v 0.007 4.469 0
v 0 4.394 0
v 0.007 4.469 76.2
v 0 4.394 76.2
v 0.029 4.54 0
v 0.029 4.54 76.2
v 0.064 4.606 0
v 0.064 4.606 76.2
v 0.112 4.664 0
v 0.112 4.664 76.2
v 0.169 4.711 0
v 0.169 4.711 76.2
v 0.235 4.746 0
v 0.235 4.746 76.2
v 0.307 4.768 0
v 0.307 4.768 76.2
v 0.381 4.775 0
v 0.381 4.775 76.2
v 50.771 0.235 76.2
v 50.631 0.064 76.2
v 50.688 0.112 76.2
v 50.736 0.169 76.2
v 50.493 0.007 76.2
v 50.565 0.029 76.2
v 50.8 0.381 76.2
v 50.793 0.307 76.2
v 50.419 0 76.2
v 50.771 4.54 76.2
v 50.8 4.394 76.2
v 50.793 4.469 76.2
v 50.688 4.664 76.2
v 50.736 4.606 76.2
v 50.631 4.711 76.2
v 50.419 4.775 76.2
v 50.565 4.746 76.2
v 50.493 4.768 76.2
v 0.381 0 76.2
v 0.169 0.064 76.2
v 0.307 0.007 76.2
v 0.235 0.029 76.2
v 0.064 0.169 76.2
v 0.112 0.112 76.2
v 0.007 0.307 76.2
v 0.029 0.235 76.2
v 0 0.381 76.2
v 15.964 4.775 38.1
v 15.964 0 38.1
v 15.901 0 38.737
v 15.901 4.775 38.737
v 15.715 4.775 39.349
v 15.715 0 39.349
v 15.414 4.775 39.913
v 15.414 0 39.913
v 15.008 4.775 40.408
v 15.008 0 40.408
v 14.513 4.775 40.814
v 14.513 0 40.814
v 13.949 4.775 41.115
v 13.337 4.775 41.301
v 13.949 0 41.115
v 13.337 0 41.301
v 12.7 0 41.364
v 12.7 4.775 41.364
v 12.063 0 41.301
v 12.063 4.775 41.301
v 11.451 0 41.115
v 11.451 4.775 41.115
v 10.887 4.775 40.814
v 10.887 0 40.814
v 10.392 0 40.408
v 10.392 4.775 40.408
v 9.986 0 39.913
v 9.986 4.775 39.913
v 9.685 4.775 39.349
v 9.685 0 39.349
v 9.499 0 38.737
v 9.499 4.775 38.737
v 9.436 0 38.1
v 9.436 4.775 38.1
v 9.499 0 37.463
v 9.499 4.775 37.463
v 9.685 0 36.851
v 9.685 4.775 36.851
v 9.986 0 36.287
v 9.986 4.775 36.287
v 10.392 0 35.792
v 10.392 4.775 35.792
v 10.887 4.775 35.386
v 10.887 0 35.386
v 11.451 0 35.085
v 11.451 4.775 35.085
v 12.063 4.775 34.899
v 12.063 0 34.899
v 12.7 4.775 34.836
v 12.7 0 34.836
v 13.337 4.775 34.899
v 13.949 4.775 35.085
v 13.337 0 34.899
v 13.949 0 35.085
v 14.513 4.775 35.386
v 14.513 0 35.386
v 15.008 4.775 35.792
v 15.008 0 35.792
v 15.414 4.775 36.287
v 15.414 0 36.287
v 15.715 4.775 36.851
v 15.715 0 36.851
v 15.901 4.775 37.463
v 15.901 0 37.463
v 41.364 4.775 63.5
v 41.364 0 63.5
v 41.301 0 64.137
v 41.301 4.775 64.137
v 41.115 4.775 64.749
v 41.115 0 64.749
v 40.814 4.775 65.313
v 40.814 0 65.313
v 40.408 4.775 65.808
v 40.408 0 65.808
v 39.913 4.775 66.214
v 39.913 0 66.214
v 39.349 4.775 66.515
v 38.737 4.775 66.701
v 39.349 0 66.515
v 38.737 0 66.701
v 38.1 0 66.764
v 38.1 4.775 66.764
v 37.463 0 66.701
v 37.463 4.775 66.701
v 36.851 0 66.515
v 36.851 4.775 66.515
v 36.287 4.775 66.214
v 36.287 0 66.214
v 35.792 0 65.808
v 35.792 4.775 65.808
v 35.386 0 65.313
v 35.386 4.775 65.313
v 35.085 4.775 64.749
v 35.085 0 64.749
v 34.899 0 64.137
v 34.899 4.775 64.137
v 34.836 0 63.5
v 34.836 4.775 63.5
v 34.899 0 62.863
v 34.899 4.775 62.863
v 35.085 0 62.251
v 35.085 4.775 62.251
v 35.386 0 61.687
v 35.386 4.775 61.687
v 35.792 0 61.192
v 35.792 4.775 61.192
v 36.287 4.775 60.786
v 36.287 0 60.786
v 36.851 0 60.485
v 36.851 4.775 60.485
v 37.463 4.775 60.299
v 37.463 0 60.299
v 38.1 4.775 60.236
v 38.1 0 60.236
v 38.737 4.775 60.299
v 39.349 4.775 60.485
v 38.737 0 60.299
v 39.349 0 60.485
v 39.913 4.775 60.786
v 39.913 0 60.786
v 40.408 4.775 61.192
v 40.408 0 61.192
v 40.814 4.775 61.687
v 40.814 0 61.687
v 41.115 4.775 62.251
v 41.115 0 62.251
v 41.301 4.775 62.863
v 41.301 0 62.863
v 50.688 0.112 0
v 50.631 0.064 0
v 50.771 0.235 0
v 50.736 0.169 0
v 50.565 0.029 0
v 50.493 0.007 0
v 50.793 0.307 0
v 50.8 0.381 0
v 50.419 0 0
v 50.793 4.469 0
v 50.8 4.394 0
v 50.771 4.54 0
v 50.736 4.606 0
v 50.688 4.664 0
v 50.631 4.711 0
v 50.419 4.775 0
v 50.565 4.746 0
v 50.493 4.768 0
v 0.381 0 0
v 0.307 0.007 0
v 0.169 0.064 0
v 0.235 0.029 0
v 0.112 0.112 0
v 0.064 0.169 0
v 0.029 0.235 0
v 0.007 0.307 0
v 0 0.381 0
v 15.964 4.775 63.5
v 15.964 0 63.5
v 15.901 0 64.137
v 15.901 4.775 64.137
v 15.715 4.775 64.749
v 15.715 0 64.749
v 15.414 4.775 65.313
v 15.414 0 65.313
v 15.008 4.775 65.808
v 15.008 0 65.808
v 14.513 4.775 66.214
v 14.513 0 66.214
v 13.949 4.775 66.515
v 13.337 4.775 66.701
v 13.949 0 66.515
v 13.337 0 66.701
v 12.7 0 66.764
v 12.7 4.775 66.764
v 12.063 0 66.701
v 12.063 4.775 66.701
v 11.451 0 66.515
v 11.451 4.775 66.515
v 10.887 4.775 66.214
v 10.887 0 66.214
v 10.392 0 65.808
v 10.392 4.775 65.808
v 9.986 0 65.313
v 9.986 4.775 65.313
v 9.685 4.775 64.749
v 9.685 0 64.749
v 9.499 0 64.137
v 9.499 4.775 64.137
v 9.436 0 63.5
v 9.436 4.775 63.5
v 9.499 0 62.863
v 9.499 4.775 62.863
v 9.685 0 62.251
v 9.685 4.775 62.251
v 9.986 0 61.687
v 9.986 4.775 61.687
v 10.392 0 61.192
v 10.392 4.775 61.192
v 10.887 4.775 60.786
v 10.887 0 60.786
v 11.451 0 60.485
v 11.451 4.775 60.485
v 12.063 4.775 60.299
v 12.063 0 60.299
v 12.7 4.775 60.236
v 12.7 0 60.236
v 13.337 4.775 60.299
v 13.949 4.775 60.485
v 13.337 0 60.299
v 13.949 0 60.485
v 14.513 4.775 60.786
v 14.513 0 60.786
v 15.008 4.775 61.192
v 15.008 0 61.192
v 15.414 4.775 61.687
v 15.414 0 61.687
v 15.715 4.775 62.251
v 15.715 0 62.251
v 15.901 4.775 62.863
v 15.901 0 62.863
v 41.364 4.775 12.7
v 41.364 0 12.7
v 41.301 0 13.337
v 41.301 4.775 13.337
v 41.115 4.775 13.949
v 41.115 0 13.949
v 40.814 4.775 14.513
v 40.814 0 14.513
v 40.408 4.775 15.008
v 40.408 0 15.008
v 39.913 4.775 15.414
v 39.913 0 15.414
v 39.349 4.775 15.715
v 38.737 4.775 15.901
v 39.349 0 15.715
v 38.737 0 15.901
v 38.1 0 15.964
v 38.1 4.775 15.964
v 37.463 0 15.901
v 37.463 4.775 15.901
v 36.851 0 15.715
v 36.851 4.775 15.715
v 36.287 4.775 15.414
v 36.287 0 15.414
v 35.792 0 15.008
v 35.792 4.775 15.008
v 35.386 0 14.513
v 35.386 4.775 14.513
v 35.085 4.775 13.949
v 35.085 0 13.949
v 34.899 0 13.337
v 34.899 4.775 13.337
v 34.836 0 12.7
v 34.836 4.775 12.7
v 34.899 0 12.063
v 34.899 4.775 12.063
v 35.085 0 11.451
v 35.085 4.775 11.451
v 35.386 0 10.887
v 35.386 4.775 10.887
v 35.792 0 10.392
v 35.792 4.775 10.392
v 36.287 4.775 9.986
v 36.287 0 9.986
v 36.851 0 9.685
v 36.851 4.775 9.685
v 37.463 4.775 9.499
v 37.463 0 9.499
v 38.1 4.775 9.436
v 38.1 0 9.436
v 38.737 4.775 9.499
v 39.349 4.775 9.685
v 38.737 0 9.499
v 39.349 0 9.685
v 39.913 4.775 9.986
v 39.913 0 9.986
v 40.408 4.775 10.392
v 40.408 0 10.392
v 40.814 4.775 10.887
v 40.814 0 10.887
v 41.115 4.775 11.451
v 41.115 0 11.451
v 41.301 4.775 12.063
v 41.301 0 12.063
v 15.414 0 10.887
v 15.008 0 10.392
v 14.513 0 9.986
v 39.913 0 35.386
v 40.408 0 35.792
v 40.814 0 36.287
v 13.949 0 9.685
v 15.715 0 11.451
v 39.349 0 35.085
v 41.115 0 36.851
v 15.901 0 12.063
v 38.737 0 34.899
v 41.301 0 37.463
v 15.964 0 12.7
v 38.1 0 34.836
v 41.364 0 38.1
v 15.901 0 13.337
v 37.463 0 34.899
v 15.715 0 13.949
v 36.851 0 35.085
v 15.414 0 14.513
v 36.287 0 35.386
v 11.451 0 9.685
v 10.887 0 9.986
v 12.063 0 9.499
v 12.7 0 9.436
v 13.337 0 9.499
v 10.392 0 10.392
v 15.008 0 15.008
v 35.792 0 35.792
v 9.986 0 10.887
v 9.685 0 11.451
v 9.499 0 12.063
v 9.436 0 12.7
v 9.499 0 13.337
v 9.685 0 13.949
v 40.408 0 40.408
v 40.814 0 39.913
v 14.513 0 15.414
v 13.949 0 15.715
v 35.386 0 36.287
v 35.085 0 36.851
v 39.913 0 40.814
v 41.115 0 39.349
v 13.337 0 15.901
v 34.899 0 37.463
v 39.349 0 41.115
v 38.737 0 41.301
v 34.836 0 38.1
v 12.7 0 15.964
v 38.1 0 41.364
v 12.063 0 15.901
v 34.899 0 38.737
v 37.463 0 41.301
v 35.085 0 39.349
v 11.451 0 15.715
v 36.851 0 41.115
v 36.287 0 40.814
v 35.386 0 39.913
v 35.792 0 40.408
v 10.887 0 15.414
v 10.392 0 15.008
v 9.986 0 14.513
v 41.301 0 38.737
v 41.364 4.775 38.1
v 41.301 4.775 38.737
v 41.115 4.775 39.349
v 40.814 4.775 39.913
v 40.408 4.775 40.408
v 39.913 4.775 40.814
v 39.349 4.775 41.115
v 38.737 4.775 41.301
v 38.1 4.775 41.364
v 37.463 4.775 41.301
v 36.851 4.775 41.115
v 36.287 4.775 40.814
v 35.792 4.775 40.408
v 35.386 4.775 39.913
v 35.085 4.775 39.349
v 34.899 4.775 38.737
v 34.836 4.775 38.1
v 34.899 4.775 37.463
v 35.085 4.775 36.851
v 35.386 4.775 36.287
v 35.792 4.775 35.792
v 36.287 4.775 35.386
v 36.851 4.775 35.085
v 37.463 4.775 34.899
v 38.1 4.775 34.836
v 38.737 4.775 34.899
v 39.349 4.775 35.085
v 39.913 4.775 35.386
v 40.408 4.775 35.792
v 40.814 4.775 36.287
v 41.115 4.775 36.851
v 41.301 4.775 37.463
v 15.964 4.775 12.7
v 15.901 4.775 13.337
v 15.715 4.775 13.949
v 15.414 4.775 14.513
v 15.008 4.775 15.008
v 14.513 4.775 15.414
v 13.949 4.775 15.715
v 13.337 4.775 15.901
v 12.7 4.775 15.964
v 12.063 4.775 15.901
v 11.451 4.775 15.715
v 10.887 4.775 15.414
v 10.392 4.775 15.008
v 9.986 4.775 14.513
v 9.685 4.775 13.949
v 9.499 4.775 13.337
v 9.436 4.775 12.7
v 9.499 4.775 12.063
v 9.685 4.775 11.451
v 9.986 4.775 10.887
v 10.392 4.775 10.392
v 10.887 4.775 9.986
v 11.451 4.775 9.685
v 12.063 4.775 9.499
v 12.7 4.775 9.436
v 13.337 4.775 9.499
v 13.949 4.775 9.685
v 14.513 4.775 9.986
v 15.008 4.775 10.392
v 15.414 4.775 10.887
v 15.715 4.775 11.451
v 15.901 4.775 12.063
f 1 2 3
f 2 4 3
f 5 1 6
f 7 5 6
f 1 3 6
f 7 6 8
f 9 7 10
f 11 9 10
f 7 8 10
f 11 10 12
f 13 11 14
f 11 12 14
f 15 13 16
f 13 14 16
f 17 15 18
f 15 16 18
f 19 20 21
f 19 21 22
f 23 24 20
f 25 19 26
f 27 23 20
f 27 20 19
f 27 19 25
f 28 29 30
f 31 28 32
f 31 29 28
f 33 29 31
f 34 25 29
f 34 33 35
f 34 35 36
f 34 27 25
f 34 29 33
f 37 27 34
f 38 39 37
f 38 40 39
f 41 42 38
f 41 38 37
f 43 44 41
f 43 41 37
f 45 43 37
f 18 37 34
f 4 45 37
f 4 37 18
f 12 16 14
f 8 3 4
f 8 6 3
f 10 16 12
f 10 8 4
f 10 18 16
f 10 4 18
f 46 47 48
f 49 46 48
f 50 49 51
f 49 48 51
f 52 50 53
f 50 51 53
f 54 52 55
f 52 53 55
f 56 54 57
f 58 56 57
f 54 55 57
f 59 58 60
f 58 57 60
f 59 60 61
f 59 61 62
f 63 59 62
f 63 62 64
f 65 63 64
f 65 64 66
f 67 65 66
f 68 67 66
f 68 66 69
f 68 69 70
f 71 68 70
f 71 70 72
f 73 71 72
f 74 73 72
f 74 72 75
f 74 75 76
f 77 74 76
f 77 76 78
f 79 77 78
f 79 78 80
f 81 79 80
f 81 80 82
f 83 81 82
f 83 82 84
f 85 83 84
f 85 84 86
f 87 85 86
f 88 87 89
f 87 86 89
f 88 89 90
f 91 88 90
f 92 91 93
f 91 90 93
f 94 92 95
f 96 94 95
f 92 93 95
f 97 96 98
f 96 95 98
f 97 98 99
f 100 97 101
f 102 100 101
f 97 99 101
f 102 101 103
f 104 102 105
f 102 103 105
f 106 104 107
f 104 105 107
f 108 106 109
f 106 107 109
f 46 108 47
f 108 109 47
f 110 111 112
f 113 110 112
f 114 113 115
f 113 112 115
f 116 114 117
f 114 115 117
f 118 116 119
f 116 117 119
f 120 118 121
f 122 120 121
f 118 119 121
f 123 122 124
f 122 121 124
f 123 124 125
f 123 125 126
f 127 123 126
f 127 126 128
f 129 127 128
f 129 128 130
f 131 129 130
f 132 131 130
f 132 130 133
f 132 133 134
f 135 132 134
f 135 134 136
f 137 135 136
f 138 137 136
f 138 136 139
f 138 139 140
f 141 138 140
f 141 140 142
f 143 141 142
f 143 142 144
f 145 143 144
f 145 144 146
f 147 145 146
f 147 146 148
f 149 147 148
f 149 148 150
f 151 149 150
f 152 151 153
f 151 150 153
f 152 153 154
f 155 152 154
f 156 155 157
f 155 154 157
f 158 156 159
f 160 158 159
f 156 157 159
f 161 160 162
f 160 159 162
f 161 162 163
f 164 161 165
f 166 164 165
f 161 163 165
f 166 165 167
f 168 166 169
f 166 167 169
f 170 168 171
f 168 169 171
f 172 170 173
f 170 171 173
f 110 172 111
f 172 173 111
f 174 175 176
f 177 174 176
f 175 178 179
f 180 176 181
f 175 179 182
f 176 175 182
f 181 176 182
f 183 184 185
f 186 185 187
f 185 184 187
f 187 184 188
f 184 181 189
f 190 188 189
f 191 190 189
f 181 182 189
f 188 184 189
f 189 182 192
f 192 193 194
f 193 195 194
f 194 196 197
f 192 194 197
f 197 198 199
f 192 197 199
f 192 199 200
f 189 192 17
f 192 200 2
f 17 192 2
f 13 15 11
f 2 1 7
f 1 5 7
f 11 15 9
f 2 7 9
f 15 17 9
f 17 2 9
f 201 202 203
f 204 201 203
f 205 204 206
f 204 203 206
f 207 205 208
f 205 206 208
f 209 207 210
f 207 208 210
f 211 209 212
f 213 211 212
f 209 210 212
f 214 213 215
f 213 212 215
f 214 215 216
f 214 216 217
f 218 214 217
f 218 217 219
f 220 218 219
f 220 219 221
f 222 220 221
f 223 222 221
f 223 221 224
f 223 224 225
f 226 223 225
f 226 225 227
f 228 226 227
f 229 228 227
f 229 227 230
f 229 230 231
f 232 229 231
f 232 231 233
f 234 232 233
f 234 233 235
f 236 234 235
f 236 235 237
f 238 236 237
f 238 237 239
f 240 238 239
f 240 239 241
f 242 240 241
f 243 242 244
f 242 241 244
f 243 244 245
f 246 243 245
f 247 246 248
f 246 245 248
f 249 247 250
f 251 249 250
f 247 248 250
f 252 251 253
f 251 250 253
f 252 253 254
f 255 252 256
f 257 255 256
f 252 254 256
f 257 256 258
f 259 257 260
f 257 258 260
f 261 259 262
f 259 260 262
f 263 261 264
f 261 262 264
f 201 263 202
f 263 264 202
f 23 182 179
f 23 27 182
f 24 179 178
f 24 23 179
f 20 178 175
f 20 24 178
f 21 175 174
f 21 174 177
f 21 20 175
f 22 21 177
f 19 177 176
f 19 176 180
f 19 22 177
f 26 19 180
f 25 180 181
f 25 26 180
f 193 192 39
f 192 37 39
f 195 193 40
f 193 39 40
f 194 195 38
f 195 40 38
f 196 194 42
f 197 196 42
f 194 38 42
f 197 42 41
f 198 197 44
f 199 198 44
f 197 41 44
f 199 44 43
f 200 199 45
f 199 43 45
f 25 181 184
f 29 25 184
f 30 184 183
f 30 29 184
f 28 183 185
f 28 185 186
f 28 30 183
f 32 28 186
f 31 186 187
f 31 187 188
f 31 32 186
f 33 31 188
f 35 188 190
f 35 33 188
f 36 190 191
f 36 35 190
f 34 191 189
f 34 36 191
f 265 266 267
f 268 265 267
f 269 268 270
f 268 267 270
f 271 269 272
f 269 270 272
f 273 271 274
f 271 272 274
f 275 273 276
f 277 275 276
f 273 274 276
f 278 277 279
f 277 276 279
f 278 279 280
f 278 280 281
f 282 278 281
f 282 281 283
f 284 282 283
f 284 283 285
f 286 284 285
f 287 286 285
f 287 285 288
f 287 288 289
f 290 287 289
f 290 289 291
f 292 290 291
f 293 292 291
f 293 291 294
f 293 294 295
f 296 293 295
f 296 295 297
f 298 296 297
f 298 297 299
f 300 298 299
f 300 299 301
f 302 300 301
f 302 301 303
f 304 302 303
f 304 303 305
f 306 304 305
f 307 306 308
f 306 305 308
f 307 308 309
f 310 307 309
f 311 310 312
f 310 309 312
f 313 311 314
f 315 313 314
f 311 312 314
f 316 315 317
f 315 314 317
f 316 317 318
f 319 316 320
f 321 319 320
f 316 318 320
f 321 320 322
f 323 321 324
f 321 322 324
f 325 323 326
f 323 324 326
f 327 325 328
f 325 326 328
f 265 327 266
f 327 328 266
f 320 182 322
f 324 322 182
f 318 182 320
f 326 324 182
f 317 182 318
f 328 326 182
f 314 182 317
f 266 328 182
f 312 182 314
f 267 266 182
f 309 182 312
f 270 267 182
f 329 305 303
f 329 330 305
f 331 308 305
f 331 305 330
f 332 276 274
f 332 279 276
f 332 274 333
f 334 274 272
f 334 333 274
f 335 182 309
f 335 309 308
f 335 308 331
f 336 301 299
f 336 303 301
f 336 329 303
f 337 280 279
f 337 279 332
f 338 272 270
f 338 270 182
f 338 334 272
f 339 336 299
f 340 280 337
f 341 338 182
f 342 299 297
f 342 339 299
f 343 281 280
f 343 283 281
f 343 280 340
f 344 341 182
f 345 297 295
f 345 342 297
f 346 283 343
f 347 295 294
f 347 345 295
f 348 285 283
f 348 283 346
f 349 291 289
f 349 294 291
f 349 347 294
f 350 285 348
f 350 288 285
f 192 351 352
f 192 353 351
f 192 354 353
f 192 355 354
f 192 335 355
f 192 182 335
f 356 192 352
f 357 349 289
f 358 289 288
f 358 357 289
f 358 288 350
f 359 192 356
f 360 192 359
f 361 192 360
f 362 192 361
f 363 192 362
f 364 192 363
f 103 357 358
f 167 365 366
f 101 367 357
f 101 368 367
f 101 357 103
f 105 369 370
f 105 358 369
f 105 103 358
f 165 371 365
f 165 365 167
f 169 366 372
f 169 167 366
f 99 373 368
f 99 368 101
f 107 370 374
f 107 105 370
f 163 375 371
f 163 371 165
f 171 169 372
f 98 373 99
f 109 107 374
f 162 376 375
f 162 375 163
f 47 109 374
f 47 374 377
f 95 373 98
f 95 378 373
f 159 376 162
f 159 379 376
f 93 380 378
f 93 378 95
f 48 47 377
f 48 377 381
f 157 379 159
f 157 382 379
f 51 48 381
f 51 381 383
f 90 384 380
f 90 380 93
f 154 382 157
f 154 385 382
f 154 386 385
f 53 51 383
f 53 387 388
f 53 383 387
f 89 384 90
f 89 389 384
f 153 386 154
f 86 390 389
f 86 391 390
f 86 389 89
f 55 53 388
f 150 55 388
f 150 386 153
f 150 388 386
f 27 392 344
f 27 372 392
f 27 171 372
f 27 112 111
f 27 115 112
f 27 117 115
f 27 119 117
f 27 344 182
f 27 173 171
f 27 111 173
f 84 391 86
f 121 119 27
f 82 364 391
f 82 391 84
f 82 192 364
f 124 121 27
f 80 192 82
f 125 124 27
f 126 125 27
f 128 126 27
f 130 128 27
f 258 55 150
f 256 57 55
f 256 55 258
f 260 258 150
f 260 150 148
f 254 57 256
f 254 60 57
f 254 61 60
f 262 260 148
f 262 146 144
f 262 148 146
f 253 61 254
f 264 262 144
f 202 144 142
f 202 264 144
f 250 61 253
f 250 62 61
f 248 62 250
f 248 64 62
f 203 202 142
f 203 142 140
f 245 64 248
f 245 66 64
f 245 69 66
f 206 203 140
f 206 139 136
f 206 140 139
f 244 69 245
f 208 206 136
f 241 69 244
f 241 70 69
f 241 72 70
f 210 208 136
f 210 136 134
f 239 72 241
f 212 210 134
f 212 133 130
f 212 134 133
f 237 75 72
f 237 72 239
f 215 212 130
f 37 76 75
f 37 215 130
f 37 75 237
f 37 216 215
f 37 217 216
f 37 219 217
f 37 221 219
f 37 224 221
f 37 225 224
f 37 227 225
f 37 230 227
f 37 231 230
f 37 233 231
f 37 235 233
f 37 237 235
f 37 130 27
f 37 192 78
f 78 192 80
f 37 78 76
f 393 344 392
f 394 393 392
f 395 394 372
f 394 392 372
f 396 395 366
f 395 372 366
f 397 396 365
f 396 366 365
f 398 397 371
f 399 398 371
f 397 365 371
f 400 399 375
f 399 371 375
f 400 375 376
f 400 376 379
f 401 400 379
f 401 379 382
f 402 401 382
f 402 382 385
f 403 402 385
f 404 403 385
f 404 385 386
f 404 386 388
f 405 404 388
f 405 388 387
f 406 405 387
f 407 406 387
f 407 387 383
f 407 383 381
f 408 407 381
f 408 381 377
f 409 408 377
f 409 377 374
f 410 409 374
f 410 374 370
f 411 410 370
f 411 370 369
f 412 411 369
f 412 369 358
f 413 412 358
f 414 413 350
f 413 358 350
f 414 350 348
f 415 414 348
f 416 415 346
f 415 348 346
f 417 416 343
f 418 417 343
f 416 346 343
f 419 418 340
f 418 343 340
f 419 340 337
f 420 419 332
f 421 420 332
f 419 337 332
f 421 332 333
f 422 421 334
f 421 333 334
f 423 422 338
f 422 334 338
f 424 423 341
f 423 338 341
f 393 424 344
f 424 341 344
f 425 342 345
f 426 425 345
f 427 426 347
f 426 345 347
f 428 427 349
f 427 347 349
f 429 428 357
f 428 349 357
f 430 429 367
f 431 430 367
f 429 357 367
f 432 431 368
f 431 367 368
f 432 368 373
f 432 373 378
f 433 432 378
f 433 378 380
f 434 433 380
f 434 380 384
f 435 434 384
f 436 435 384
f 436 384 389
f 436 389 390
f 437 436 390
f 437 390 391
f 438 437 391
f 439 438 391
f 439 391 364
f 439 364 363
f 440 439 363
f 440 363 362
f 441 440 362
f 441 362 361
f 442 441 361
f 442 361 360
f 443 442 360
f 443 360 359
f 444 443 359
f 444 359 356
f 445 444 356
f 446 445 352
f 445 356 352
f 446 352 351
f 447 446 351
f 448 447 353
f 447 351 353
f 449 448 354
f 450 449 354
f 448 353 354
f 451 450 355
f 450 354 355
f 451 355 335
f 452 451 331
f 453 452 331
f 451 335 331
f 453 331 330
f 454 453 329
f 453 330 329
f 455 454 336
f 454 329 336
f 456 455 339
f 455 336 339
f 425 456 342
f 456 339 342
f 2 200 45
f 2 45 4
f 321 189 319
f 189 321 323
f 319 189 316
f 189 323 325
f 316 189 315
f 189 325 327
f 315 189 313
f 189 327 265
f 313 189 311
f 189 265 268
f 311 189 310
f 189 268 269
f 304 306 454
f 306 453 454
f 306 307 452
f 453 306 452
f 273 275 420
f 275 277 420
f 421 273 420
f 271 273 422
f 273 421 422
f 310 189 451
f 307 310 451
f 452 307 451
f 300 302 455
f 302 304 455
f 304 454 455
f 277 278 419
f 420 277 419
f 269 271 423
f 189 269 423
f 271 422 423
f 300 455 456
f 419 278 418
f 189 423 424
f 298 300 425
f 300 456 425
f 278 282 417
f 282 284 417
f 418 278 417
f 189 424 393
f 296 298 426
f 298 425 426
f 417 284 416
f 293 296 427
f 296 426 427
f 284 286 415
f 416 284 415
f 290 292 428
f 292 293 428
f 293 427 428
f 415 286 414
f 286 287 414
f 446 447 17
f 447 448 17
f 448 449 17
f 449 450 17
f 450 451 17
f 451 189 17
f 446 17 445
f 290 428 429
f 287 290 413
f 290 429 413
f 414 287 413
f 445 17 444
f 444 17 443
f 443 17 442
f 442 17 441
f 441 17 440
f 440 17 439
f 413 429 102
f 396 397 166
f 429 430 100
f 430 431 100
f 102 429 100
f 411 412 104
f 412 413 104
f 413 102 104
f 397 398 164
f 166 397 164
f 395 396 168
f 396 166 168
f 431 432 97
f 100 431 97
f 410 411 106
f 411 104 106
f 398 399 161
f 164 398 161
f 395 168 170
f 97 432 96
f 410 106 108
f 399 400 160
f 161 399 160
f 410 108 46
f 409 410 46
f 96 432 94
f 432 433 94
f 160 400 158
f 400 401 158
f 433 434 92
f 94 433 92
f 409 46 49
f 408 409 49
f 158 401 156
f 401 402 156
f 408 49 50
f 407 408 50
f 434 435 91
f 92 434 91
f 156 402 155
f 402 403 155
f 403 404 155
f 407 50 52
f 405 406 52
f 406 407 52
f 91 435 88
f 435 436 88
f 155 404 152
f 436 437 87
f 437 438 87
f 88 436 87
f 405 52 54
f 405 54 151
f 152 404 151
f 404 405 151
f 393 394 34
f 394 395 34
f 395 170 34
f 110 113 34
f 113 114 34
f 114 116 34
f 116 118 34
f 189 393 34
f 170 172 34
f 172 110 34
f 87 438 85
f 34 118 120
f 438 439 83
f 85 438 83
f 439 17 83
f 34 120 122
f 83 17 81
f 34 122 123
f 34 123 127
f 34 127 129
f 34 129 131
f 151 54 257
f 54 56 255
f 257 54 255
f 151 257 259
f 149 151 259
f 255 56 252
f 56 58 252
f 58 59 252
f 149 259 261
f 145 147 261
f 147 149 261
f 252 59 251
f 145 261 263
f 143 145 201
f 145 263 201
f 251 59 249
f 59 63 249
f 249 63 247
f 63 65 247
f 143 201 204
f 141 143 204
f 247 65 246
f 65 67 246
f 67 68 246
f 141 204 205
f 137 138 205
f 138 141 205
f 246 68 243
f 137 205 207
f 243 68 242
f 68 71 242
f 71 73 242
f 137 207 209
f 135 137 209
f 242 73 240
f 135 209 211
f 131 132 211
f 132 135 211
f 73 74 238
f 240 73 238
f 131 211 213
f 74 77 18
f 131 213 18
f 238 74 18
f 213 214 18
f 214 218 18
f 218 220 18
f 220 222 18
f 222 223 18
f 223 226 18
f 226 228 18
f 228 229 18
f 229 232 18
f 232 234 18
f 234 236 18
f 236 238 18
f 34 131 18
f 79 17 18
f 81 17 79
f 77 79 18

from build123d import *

# Parameters (mm, degrees)
BOSS_EXTRUDE1_OUTLINE_W  = 4.7752
BOSS_EXTRUDE1_OUTLINE_H  = 76.2
BOSS_EXTRUDE1_DEPTH      = 50.8
F_0_257_DIAMETER_HOLE1_D = 6.5278
FILLET1_R                = 0.381
LPATTERN1_COUNT          = 4
LPATTERN1_PITCH          = 25.4
LPATTERN1_COUNT_DIR2     = 2
LPATTERN1_PITCH_DIR2     = 25.4


# Read off the part's stored shape, not the designer's step: Boss-Extrude1
with BuildPart() as part:
    # Boss-Extrude1 outline → Boss-Extrude1 (new body)
    with BuildSketch(Plane.YZ):
        with Locations((2.3876, 38.1)):
            Rectangle(BOSS_EXTRUDE1_OUTLINE_W, BOSS_EXTRUDE1_OUTLINE_H)
    extrude(amount=BOSS_EXTRUDE1_DEPTH)

    # F (0.257) Diameter Hole1 (through all)
    with Locations(Plane(origin=(0, 4.7752, 0), x_dir=(-1, 0, 0), z_dir=(0, 1, 0))):
        with Locations((-38.1, 63.5)):
            f_0_257_diameter_hole1 = Hole(F_0_257_DIAMETER_HOLE1_D / 2)

    # Fillet1
    fillet1_edges = [part.edges().sort_by_distance(p)[0] for p in [
        (50.8, 4.7752, 38.1),
        (0, 4.7752, 38.1),
        (50.8, 0, 38.1),
        (0, 0, 38.1),
    ]]
    fillet(fillet1_edges, radius=FILLET1_R)

    # LPattern1: F _0.257_ Diameter Hole1 4 × 2
    with Locations(*[(-j * LPATTERN1_PITCH_DIR2, 0, -i * LPATTERN1_PITCH) for i in range(LPATTERN1_COUNT) for j in range(LPATTERN1_COUNT_DIR2) if (i, j) != (0, 0)]):
        add(f_0_257_diameter_hole1, mode=Mode.SUBTRACT)


solid = part.part
